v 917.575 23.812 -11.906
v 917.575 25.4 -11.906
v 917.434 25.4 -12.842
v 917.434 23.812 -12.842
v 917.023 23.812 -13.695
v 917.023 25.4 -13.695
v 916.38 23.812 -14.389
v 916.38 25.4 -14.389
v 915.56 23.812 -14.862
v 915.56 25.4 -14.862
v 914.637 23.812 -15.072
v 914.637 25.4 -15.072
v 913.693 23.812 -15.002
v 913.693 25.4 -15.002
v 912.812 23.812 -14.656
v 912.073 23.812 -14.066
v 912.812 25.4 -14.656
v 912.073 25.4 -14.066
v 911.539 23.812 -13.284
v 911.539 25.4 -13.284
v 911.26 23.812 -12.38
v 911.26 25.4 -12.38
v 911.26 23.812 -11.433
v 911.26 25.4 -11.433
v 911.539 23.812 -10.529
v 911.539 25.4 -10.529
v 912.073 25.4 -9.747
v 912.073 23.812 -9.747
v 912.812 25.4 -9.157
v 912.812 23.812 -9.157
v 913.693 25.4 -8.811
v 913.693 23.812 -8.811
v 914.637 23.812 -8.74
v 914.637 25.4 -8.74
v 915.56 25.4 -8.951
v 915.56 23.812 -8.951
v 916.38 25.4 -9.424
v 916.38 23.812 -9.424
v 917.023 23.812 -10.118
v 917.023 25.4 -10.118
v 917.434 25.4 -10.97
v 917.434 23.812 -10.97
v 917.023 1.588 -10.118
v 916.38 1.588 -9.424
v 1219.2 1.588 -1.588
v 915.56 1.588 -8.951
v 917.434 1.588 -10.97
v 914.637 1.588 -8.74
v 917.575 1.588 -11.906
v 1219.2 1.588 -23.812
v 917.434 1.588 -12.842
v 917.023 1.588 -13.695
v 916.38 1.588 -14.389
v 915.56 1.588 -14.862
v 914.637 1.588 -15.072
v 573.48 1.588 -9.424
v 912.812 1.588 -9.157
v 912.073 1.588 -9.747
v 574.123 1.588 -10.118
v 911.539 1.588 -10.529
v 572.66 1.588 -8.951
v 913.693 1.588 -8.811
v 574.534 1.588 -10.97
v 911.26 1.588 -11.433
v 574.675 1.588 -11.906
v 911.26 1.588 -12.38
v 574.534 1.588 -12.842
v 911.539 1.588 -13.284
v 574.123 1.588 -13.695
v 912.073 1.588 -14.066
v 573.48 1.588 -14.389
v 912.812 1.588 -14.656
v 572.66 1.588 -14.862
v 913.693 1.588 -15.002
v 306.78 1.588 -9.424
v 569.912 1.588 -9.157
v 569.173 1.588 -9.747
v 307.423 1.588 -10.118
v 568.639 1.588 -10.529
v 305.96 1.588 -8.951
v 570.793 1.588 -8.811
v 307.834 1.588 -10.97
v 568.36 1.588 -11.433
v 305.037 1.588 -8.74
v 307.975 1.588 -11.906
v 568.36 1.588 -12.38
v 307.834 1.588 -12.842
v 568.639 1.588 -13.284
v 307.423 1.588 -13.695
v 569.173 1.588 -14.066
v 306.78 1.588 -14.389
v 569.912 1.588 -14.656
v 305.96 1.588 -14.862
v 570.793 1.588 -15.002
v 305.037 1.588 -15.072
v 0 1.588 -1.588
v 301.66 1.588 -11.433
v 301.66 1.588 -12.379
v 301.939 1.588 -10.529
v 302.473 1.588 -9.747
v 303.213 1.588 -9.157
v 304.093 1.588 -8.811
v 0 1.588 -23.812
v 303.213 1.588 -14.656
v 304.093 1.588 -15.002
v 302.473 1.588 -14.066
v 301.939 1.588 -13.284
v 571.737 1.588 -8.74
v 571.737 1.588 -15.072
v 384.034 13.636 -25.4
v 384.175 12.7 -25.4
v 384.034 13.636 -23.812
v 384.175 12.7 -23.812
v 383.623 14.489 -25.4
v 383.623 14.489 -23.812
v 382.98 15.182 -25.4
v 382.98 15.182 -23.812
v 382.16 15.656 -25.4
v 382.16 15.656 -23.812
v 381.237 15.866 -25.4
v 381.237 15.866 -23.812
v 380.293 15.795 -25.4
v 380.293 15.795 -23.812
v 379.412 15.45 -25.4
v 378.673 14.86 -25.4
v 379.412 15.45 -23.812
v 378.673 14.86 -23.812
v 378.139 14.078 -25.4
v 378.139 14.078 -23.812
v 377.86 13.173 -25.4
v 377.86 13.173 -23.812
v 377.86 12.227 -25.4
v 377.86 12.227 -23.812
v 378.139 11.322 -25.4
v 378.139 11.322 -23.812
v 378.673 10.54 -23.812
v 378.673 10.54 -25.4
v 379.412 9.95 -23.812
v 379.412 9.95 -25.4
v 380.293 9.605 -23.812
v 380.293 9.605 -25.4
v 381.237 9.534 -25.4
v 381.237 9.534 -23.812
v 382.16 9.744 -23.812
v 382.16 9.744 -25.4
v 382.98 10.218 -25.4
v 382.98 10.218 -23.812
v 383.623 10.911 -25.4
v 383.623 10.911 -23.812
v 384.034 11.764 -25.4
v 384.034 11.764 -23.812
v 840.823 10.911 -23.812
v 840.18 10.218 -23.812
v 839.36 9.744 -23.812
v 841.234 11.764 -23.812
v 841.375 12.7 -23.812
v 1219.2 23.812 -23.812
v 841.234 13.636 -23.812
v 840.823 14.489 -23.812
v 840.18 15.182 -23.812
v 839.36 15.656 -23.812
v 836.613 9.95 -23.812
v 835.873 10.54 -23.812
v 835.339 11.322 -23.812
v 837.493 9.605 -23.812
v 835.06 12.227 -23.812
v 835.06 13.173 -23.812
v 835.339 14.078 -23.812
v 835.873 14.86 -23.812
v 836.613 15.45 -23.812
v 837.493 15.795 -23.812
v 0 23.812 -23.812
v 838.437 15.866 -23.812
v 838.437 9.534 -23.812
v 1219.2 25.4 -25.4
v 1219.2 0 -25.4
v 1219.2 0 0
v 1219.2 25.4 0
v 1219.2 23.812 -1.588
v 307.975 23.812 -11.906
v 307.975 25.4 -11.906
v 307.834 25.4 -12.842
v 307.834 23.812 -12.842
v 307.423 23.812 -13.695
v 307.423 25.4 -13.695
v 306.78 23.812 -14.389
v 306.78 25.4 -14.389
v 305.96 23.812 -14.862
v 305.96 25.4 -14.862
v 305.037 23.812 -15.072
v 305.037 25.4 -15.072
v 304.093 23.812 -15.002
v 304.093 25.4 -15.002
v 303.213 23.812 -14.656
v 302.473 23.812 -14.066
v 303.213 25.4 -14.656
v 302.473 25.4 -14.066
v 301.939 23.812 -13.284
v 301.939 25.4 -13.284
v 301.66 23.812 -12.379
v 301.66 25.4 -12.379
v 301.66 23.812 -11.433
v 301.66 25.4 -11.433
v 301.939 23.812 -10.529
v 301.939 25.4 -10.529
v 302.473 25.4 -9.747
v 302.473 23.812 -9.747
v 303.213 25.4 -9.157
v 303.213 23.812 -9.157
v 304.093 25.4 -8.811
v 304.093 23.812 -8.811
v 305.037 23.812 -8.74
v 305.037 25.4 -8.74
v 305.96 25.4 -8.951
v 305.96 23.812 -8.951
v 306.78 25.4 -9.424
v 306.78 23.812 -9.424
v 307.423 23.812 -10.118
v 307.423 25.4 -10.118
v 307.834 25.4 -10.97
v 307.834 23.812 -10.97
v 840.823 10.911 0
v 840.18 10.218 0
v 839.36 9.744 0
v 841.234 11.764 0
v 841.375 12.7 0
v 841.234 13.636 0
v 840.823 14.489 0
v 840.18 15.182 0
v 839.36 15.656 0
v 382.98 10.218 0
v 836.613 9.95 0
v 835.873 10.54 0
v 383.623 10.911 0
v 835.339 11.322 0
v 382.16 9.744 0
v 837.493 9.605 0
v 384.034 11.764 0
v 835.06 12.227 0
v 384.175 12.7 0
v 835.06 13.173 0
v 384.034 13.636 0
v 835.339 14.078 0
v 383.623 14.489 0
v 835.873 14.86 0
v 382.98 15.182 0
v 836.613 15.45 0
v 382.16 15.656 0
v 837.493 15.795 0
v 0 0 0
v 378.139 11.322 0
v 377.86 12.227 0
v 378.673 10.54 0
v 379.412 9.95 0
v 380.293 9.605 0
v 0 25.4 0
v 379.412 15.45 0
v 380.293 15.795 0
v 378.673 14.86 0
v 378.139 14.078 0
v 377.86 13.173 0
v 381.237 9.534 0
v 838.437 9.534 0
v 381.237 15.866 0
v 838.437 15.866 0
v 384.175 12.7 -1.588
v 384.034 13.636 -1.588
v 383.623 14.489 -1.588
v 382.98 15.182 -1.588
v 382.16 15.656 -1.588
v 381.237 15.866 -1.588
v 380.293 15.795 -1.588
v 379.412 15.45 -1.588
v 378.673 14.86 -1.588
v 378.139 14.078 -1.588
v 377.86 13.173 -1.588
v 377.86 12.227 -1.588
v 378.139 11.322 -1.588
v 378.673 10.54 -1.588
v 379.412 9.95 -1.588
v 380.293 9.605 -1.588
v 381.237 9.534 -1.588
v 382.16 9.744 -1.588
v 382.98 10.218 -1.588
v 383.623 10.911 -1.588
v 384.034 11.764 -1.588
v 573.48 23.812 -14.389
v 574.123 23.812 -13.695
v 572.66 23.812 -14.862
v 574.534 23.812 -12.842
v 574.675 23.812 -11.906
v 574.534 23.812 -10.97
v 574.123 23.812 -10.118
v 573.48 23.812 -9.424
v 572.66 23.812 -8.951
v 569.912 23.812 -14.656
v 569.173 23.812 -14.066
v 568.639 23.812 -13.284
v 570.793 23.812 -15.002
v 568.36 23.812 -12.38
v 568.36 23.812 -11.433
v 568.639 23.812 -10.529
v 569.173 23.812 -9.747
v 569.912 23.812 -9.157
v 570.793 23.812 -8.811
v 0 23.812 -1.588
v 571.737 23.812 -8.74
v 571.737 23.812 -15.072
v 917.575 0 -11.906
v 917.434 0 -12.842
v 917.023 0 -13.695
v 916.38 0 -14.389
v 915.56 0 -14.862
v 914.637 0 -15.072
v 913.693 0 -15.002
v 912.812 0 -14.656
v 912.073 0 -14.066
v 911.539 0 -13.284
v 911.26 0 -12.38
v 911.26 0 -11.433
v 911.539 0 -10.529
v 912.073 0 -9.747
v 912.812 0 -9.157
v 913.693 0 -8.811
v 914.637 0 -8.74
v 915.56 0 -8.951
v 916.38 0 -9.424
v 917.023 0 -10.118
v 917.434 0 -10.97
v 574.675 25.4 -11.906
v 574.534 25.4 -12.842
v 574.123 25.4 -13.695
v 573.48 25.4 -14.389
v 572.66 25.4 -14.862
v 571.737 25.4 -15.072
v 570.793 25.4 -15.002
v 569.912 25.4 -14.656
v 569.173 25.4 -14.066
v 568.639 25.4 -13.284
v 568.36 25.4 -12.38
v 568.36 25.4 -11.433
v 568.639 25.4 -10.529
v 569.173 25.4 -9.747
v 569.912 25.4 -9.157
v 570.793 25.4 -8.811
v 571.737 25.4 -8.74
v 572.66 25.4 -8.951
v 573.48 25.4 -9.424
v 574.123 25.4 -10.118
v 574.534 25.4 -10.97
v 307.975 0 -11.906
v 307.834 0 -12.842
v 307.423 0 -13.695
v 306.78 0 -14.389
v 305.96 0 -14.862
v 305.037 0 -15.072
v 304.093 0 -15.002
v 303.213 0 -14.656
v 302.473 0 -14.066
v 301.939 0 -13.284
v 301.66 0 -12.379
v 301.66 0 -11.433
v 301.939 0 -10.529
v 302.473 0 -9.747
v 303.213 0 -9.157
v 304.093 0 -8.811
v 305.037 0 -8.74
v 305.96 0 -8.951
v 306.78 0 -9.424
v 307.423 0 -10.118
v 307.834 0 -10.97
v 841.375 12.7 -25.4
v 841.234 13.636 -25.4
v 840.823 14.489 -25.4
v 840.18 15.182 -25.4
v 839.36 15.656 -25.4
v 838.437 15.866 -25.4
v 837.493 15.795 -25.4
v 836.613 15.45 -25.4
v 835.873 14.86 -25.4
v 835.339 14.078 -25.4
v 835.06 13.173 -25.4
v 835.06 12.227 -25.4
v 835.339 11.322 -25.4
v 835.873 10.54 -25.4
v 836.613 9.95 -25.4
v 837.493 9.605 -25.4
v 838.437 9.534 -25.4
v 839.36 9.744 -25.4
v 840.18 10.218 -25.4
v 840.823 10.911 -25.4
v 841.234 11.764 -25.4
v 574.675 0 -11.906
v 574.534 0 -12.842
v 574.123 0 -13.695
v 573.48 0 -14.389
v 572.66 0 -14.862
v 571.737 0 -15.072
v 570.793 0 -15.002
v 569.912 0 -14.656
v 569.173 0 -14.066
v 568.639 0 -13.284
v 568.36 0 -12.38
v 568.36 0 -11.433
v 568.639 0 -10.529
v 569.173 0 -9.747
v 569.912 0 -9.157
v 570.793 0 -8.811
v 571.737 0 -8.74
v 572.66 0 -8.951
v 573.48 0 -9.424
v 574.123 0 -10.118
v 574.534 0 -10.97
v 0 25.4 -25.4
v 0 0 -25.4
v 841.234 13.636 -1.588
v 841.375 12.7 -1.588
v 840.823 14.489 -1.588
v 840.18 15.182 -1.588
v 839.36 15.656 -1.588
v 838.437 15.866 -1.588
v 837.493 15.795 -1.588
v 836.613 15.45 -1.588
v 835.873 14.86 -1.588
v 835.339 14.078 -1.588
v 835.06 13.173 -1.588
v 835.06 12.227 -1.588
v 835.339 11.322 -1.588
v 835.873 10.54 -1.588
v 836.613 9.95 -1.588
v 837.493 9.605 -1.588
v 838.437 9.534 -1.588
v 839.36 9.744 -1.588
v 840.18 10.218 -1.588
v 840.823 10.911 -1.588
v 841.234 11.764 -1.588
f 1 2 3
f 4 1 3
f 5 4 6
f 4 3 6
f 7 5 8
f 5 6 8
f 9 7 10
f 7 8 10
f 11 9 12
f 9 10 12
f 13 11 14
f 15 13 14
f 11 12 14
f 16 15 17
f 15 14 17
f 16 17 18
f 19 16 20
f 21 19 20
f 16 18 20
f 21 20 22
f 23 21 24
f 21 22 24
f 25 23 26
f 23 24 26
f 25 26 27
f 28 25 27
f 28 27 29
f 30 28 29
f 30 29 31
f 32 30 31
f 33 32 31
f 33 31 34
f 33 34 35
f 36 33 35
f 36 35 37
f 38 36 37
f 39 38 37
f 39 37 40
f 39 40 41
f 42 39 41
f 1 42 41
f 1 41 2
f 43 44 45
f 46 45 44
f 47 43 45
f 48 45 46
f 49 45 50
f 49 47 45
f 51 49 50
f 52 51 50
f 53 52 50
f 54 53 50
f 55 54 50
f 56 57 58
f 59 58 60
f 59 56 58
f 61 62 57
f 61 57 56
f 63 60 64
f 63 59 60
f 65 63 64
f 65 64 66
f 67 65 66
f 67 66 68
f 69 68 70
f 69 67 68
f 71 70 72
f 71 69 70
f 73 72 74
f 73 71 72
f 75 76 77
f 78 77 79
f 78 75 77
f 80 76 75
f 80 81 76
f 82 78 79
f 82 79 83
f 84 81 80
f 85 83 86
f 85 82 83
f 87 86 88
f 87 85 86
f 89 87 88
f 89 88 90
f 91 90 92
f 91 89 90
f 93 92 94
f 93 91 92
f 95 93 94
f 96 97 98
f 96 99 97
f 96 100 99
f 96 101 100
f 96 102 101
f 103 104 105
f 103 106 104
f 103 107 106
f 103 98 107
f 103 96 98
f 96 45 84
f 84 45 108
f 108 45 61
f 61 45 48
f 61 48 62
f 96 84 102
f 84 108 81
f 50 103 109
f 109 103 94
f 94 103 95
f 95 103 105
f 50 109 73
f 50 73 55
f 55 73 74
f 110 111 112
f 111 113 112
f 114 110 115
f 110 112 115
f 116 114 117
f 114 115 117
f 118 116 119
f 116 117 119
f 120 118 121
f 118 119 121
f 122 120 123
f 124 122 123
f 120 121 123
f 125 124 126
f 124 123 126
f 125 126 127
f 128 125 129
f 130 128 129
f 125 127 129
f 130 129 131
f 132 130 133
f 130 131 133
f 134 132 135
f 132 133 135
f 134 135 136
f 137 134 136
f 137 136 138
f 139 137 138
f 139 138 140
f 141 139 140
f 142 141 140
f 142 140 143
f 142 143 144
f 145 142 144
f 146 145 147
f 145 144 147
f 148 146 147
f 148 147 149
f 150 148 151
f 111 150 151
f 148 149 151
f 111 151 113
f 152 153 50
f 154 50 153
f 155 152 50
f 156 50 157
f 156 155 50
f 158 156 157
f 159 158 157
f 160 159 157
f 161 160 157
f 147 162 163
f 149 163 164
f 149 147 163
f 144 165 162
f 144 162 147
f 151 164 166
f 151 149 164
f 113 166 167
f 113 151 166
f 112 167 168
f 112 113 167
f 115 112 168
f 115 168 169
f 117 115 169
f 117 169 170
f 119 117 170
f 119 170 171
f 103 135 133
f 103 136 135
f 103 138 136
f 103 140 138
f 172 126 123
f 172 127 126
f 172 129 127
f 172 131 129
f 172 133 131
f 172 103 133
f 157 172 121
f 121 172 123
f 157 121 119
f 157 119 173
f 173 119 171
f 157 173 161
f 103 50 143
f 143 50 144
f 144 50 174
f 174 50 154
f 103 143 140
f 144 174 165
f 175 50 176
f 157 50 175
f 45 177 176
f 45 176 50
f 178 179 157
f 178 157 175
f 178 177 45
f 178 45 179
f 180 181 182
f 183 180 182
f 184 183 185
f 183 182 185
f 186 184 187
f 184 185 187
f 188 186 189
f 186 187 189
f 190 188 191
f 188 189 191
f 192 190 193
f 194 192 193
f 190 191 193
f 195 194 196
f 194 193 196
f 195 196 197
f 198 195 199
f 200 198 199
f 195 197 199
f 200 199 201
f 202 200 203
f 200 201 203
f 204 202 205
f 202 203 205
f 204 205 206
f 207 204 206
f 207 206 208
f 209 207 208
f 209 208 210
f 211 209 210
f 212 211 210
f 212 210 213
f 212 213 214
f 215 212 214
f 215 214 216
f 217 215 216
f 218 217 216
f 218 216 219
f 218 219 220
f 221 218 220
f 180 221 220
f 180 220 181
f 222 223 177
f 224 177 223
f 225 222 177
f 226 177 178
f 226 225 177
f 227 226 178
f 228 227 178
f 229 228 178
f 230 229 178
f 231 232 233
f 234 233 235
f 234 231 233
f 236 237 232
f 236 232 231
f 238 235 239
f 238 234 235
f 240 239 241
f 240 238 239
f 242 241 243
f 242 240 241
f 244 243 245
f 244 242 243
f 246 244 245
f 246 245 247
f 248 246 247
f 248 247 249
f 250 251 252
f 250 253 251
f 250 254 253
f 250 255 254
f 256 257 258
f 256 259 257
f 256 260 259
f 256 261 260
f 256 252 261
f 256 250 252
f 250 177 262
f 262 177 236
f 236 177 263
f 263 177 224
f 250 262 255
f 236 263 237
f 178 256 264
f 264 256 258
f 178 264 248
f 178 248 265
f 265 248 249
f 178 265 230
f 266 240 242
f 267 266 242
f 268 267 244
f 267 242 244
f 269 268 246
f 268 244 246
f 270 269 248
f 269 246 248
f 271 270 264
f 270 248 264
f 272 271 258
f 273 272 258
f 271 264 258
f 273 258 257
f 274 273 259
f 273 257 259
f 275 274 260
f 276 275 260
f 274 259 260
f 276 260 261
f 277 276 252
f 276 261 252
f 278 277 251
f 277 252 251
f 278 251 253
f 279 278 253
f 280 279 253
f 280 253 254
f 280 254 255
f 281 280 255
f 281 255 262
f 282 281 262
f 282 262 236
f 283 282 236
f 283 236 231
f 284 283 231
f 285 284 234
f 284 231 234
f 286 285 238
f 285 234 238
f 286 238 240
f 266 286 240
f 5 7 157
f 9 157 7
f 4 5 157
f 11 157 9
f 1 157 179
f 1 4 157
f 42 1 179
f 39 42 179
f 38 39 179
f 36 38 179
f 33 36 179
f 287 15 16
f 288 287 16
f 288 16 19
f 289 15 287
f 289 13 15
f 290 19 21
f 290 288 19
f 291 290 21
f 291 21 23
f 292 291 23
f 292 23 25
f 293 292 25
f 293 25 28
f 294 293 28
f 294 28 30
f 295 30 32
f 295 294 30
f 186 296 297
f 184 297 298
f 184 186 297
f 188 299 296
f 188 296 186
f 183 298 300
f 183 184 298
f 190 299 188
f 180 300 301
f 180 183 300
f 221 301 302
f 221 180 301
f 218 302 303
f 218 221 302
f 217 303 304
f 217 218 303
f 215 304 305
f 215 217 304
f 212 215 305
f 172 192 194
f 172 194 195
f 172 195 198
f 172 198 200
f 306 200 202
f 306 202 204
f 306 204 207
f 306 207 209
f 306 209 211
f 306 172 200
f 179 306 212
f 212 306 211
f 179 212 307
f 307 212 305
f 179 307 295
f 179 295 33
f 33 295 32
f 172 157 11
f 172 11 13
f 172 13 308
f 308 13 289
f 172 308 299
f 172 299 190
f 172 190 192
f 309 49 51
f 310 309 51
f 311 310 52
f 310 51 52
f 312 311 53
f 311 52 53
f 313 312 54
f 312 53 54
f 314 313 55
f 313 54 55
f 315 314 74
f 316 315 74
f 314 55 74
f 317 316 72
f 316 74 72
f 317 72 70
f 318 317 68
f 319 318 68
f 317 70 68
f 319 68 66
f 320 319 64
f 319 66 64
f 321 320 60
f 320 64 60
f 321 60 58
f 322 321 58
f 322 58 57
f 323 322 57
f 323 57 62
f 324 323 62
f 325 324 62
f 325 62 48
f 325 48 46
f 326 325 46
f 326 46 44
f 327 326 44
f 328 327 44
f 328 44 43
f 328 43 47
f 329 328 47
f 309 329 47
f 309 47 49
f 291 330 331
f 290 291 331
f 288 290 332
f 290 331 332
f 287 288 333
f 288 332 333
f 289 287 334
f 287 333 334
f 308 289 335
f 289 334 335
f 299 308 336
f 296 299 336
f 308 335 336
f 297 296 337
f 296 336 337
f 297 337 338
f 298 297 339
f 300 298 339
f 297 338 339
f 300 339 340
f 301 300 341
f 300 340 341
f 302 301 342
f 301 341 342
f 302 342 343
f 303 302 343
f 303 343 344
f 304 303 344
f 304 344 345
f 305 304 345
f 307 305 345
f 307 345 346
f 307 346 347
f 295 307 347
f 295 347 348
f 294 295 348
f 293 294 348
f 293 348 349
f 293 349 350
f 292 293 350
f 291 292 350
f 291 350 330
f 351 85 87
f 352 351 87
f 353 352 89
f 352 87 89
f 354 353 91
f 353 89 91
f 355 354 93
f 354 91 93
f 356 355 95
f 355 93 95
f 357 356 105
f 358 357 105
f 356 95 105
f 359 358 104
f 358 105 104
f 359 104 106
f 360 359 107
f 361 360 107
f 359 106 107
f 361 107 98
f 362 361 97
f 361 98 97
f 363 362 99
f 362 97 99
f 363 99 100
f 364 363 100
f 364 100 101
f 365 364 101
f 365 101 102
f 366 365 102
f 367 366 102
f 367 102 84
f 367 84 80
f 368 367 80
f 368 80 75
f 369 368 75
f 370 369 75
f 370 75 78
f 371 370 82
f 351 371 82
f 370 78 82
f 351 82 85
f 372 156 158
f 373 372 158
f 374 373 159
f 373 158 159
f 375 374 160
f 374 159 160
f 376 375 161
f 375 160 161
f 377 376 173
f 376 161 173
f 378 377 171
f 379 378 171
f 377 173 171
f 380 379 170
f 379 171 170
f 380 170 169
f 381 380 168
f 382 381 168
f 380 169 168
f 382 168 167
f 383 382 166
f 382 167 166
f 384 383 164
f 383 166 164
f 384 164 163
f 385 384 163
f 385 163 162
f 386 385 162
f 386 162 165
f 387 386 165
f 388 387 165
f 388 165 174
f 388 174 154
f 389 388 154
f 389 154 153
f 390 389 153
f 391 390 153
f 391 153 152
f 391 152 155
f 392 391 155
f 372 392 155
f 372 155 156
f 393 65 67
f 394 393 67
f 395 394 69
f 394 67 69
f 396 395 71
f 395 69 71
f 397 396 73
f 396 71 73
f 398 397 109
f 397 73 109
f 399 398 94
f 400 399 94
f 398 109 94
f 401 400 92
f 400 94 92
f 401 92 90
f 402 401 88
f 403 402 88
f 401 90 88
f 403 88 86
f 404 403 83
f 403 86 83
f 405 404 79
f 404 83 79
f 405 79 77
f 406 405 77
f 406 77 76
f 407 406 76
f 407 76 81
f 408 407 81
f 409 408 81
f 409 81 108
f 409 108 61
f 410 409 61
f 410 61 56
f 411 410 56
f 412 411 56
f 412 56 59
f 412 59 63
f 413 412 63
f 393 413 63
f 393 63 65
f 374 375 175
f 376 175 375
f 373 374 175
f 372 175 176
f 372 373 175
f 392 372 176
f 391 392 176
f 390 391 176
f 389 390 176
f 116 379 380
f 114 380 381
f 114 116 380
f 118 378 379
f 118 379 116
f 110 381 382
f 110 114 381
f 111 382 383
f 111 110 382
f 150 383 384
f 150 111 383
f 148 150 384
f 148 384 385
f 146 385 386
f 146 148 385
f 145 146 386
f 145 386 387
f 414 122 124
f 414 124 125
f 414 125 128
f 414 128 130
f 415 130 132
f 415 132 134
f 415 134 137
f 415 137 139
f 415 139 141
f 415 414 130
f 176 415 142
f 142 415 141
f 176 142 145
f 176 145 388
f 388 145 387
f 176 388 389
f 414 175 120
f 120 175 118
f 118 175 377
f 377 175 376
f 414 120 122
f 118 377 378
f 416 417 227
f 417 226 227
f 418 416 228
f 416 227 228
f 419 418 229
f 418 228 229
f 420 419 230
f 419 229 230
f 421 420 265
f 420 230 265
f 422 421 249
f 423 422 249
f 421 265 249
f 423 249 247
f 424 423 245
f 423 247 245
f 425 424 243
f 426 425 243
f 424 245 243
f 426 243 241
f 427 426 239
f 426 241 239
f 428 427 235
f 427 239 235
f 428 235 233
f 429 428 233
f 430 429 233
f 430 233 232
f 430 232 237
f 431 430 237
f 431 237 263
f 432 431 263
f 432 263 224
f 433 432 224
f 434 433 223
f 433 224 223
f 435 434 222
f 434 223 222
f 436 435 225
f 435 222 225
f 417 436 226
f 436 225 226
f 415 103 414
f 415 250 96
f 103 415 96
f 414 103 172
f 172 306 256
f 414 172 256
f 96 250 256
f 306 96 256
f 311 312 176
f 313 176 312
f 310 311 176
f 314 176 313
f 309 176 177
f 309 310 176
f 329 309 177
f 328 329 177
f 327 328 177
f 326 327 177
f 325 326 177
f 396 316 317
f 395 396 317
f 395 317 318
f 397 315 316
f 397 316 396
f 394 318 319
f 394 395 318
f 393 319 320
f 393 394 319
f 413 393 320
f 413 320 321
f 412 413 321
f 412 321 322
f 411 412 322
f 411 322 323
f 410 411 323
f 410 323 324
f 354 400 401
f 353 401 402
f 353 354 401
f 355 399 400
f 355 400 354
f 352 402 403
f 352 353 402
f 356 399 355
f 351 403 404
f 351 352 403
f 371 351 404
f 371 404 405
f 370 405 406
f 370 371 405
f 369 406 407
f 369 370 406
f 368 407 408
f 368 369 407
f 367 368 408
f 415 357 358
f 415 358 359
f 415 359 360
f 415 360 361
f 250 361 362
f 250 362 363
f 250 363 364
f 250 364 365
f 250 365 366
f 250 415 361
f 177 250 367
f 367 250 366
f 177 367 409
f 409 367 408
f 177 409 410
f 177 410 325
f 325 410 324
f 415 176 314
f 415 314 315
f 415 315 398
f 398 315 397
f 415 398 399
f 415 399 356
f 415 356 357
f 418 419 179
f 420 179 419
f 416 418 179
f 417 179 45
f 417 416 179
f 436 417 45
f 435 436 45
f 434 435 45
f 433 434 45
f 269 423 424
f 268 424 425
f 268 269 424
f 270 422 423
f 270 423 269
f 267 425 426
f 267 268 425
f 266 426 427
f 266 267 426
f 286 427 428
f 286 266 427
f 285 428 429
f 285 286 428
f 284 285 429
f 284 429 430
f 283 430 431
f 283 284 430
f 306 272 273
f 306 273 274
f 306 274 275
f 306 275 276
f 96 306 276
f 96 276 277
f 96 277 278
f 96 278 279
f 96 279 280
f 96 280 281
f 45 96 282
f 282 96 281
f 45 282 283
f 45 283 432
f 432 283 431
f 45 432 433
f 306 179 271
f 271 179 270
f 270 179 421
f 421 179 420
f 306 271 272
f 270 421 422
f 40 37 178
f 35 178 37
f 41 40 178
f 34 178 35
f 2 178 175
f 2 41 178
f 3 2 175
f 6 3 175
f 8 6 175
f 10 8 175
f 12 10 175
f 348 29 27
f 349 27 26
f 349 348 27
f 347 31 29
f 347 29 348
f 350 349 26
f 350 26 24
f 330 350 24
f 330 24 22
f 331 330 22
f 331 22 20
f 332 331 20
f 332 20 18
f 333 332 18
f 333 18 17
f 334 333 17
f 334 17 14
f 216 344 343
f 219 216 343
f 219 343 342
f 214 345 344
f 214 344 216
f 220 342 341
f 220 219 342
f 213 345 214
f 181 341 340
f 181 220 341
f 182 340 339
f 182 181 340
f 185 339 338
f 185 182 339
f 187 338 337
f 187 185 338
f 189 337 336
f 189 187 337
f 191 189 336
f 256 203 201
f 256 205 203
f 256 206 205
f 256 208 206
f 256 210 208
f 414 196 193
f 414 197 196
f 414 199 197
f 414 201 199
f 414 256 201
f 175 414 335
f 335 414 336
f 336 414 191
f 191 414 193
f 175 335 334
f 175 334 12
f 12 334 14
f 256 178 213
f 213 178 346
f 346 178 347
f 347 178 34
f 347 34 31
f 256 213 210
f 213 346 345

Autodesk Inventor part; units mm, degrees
ref_plane "YZ Plane" through (0, 0, 0) normal (1, 0, 0) x (0, 1, 0)
ref_plane "XZ Plane" through (0, 0, 0) normal (0, 1, 0) x (-1, 0, 0)
ref_plane "XY Plane" through (0, 0, 0) normal (0, 0, 1) x (1, 0, 0)
sketch "Sketch1" plane through (0, 0, 0) normal (1, 0, 0) x (0, 1, 0)
  line L0 (0, 0) -> (25.4, 0)
  line L1 (25.4, 0) -> (25.4, -25.4)
  line L2 (25.4, -25.4) -> (0, -25.4)
  line L3 (0, -25.4) -> (0, 0)
  line L4 (23.8125, -23.8125) -> (23.8125, -1.5875)
  line L5 (23.8125, -1.5875) -> (1.5875, -1.5875)
  line L6 (1.5875, -1.5875) -> (1.5875, -23.8125)
  line L7 (1.5875, -23.8125) -> (23.8125, -23.8125)
  dimension "d0" = 25.4
  dimension "d1" = 25.4
  dimension "d2" = 1.5875
extrude "Extrusion1" add sketch "Sketch1" along normal blind 1219.2
sketch "Sketch3" plane through (0, 25.4, 0) normal (0, 1, 0) x (1, 0, 0)
  line L0 (0, 23.8125) -> (1219.2, 23.8125) projected
  line L1 (609.6, 23.8125) -> (609.6, 0) construction
  line L2 (0, 0) -> (1219.2, 0) projected
  line L3 (609.6, 11.9062) -> (465.3189, 11.9062) construction
  circle A0 centre (304.8, 11.9062) radius 3.175
  circle A1 centre (914.4, 11.9063) radius 3.175
  circle A2 centre (571.5, 11.9063) radius 3.175
  dimension "d10" = 6.35
  dimension "d11" = 304.8
  dimension "d14" = 38.1
extrude "Extrusion3" cut sketch "Sketch3" against normal blind 25.4
sketch "Sketch4" plane through (0, 0, 0) normal (0, 0, 1) x (1, 0, 0)
  line L0 (0, 0) -> (0, 25.4) projected
  line L1 (0, 12.7) -> (22.1319, 12.7) construction
  circle A0 centre (838.2, 12.7) radius 3.175
  line L2 (0, 0) -> (1219.2, 0) projected
  line L3 (609.6, 0) -> (609.6, 21.6417) construction
  circle A1 centre (381, 12.7) radius 3.175
  dimension "d15" = 6.35
  dimension "d19" = 228.6
extrude "Extrusion4" cut sketch "Sketch4" against normal blind 25.4
properties part number "Lomg horizontal"
